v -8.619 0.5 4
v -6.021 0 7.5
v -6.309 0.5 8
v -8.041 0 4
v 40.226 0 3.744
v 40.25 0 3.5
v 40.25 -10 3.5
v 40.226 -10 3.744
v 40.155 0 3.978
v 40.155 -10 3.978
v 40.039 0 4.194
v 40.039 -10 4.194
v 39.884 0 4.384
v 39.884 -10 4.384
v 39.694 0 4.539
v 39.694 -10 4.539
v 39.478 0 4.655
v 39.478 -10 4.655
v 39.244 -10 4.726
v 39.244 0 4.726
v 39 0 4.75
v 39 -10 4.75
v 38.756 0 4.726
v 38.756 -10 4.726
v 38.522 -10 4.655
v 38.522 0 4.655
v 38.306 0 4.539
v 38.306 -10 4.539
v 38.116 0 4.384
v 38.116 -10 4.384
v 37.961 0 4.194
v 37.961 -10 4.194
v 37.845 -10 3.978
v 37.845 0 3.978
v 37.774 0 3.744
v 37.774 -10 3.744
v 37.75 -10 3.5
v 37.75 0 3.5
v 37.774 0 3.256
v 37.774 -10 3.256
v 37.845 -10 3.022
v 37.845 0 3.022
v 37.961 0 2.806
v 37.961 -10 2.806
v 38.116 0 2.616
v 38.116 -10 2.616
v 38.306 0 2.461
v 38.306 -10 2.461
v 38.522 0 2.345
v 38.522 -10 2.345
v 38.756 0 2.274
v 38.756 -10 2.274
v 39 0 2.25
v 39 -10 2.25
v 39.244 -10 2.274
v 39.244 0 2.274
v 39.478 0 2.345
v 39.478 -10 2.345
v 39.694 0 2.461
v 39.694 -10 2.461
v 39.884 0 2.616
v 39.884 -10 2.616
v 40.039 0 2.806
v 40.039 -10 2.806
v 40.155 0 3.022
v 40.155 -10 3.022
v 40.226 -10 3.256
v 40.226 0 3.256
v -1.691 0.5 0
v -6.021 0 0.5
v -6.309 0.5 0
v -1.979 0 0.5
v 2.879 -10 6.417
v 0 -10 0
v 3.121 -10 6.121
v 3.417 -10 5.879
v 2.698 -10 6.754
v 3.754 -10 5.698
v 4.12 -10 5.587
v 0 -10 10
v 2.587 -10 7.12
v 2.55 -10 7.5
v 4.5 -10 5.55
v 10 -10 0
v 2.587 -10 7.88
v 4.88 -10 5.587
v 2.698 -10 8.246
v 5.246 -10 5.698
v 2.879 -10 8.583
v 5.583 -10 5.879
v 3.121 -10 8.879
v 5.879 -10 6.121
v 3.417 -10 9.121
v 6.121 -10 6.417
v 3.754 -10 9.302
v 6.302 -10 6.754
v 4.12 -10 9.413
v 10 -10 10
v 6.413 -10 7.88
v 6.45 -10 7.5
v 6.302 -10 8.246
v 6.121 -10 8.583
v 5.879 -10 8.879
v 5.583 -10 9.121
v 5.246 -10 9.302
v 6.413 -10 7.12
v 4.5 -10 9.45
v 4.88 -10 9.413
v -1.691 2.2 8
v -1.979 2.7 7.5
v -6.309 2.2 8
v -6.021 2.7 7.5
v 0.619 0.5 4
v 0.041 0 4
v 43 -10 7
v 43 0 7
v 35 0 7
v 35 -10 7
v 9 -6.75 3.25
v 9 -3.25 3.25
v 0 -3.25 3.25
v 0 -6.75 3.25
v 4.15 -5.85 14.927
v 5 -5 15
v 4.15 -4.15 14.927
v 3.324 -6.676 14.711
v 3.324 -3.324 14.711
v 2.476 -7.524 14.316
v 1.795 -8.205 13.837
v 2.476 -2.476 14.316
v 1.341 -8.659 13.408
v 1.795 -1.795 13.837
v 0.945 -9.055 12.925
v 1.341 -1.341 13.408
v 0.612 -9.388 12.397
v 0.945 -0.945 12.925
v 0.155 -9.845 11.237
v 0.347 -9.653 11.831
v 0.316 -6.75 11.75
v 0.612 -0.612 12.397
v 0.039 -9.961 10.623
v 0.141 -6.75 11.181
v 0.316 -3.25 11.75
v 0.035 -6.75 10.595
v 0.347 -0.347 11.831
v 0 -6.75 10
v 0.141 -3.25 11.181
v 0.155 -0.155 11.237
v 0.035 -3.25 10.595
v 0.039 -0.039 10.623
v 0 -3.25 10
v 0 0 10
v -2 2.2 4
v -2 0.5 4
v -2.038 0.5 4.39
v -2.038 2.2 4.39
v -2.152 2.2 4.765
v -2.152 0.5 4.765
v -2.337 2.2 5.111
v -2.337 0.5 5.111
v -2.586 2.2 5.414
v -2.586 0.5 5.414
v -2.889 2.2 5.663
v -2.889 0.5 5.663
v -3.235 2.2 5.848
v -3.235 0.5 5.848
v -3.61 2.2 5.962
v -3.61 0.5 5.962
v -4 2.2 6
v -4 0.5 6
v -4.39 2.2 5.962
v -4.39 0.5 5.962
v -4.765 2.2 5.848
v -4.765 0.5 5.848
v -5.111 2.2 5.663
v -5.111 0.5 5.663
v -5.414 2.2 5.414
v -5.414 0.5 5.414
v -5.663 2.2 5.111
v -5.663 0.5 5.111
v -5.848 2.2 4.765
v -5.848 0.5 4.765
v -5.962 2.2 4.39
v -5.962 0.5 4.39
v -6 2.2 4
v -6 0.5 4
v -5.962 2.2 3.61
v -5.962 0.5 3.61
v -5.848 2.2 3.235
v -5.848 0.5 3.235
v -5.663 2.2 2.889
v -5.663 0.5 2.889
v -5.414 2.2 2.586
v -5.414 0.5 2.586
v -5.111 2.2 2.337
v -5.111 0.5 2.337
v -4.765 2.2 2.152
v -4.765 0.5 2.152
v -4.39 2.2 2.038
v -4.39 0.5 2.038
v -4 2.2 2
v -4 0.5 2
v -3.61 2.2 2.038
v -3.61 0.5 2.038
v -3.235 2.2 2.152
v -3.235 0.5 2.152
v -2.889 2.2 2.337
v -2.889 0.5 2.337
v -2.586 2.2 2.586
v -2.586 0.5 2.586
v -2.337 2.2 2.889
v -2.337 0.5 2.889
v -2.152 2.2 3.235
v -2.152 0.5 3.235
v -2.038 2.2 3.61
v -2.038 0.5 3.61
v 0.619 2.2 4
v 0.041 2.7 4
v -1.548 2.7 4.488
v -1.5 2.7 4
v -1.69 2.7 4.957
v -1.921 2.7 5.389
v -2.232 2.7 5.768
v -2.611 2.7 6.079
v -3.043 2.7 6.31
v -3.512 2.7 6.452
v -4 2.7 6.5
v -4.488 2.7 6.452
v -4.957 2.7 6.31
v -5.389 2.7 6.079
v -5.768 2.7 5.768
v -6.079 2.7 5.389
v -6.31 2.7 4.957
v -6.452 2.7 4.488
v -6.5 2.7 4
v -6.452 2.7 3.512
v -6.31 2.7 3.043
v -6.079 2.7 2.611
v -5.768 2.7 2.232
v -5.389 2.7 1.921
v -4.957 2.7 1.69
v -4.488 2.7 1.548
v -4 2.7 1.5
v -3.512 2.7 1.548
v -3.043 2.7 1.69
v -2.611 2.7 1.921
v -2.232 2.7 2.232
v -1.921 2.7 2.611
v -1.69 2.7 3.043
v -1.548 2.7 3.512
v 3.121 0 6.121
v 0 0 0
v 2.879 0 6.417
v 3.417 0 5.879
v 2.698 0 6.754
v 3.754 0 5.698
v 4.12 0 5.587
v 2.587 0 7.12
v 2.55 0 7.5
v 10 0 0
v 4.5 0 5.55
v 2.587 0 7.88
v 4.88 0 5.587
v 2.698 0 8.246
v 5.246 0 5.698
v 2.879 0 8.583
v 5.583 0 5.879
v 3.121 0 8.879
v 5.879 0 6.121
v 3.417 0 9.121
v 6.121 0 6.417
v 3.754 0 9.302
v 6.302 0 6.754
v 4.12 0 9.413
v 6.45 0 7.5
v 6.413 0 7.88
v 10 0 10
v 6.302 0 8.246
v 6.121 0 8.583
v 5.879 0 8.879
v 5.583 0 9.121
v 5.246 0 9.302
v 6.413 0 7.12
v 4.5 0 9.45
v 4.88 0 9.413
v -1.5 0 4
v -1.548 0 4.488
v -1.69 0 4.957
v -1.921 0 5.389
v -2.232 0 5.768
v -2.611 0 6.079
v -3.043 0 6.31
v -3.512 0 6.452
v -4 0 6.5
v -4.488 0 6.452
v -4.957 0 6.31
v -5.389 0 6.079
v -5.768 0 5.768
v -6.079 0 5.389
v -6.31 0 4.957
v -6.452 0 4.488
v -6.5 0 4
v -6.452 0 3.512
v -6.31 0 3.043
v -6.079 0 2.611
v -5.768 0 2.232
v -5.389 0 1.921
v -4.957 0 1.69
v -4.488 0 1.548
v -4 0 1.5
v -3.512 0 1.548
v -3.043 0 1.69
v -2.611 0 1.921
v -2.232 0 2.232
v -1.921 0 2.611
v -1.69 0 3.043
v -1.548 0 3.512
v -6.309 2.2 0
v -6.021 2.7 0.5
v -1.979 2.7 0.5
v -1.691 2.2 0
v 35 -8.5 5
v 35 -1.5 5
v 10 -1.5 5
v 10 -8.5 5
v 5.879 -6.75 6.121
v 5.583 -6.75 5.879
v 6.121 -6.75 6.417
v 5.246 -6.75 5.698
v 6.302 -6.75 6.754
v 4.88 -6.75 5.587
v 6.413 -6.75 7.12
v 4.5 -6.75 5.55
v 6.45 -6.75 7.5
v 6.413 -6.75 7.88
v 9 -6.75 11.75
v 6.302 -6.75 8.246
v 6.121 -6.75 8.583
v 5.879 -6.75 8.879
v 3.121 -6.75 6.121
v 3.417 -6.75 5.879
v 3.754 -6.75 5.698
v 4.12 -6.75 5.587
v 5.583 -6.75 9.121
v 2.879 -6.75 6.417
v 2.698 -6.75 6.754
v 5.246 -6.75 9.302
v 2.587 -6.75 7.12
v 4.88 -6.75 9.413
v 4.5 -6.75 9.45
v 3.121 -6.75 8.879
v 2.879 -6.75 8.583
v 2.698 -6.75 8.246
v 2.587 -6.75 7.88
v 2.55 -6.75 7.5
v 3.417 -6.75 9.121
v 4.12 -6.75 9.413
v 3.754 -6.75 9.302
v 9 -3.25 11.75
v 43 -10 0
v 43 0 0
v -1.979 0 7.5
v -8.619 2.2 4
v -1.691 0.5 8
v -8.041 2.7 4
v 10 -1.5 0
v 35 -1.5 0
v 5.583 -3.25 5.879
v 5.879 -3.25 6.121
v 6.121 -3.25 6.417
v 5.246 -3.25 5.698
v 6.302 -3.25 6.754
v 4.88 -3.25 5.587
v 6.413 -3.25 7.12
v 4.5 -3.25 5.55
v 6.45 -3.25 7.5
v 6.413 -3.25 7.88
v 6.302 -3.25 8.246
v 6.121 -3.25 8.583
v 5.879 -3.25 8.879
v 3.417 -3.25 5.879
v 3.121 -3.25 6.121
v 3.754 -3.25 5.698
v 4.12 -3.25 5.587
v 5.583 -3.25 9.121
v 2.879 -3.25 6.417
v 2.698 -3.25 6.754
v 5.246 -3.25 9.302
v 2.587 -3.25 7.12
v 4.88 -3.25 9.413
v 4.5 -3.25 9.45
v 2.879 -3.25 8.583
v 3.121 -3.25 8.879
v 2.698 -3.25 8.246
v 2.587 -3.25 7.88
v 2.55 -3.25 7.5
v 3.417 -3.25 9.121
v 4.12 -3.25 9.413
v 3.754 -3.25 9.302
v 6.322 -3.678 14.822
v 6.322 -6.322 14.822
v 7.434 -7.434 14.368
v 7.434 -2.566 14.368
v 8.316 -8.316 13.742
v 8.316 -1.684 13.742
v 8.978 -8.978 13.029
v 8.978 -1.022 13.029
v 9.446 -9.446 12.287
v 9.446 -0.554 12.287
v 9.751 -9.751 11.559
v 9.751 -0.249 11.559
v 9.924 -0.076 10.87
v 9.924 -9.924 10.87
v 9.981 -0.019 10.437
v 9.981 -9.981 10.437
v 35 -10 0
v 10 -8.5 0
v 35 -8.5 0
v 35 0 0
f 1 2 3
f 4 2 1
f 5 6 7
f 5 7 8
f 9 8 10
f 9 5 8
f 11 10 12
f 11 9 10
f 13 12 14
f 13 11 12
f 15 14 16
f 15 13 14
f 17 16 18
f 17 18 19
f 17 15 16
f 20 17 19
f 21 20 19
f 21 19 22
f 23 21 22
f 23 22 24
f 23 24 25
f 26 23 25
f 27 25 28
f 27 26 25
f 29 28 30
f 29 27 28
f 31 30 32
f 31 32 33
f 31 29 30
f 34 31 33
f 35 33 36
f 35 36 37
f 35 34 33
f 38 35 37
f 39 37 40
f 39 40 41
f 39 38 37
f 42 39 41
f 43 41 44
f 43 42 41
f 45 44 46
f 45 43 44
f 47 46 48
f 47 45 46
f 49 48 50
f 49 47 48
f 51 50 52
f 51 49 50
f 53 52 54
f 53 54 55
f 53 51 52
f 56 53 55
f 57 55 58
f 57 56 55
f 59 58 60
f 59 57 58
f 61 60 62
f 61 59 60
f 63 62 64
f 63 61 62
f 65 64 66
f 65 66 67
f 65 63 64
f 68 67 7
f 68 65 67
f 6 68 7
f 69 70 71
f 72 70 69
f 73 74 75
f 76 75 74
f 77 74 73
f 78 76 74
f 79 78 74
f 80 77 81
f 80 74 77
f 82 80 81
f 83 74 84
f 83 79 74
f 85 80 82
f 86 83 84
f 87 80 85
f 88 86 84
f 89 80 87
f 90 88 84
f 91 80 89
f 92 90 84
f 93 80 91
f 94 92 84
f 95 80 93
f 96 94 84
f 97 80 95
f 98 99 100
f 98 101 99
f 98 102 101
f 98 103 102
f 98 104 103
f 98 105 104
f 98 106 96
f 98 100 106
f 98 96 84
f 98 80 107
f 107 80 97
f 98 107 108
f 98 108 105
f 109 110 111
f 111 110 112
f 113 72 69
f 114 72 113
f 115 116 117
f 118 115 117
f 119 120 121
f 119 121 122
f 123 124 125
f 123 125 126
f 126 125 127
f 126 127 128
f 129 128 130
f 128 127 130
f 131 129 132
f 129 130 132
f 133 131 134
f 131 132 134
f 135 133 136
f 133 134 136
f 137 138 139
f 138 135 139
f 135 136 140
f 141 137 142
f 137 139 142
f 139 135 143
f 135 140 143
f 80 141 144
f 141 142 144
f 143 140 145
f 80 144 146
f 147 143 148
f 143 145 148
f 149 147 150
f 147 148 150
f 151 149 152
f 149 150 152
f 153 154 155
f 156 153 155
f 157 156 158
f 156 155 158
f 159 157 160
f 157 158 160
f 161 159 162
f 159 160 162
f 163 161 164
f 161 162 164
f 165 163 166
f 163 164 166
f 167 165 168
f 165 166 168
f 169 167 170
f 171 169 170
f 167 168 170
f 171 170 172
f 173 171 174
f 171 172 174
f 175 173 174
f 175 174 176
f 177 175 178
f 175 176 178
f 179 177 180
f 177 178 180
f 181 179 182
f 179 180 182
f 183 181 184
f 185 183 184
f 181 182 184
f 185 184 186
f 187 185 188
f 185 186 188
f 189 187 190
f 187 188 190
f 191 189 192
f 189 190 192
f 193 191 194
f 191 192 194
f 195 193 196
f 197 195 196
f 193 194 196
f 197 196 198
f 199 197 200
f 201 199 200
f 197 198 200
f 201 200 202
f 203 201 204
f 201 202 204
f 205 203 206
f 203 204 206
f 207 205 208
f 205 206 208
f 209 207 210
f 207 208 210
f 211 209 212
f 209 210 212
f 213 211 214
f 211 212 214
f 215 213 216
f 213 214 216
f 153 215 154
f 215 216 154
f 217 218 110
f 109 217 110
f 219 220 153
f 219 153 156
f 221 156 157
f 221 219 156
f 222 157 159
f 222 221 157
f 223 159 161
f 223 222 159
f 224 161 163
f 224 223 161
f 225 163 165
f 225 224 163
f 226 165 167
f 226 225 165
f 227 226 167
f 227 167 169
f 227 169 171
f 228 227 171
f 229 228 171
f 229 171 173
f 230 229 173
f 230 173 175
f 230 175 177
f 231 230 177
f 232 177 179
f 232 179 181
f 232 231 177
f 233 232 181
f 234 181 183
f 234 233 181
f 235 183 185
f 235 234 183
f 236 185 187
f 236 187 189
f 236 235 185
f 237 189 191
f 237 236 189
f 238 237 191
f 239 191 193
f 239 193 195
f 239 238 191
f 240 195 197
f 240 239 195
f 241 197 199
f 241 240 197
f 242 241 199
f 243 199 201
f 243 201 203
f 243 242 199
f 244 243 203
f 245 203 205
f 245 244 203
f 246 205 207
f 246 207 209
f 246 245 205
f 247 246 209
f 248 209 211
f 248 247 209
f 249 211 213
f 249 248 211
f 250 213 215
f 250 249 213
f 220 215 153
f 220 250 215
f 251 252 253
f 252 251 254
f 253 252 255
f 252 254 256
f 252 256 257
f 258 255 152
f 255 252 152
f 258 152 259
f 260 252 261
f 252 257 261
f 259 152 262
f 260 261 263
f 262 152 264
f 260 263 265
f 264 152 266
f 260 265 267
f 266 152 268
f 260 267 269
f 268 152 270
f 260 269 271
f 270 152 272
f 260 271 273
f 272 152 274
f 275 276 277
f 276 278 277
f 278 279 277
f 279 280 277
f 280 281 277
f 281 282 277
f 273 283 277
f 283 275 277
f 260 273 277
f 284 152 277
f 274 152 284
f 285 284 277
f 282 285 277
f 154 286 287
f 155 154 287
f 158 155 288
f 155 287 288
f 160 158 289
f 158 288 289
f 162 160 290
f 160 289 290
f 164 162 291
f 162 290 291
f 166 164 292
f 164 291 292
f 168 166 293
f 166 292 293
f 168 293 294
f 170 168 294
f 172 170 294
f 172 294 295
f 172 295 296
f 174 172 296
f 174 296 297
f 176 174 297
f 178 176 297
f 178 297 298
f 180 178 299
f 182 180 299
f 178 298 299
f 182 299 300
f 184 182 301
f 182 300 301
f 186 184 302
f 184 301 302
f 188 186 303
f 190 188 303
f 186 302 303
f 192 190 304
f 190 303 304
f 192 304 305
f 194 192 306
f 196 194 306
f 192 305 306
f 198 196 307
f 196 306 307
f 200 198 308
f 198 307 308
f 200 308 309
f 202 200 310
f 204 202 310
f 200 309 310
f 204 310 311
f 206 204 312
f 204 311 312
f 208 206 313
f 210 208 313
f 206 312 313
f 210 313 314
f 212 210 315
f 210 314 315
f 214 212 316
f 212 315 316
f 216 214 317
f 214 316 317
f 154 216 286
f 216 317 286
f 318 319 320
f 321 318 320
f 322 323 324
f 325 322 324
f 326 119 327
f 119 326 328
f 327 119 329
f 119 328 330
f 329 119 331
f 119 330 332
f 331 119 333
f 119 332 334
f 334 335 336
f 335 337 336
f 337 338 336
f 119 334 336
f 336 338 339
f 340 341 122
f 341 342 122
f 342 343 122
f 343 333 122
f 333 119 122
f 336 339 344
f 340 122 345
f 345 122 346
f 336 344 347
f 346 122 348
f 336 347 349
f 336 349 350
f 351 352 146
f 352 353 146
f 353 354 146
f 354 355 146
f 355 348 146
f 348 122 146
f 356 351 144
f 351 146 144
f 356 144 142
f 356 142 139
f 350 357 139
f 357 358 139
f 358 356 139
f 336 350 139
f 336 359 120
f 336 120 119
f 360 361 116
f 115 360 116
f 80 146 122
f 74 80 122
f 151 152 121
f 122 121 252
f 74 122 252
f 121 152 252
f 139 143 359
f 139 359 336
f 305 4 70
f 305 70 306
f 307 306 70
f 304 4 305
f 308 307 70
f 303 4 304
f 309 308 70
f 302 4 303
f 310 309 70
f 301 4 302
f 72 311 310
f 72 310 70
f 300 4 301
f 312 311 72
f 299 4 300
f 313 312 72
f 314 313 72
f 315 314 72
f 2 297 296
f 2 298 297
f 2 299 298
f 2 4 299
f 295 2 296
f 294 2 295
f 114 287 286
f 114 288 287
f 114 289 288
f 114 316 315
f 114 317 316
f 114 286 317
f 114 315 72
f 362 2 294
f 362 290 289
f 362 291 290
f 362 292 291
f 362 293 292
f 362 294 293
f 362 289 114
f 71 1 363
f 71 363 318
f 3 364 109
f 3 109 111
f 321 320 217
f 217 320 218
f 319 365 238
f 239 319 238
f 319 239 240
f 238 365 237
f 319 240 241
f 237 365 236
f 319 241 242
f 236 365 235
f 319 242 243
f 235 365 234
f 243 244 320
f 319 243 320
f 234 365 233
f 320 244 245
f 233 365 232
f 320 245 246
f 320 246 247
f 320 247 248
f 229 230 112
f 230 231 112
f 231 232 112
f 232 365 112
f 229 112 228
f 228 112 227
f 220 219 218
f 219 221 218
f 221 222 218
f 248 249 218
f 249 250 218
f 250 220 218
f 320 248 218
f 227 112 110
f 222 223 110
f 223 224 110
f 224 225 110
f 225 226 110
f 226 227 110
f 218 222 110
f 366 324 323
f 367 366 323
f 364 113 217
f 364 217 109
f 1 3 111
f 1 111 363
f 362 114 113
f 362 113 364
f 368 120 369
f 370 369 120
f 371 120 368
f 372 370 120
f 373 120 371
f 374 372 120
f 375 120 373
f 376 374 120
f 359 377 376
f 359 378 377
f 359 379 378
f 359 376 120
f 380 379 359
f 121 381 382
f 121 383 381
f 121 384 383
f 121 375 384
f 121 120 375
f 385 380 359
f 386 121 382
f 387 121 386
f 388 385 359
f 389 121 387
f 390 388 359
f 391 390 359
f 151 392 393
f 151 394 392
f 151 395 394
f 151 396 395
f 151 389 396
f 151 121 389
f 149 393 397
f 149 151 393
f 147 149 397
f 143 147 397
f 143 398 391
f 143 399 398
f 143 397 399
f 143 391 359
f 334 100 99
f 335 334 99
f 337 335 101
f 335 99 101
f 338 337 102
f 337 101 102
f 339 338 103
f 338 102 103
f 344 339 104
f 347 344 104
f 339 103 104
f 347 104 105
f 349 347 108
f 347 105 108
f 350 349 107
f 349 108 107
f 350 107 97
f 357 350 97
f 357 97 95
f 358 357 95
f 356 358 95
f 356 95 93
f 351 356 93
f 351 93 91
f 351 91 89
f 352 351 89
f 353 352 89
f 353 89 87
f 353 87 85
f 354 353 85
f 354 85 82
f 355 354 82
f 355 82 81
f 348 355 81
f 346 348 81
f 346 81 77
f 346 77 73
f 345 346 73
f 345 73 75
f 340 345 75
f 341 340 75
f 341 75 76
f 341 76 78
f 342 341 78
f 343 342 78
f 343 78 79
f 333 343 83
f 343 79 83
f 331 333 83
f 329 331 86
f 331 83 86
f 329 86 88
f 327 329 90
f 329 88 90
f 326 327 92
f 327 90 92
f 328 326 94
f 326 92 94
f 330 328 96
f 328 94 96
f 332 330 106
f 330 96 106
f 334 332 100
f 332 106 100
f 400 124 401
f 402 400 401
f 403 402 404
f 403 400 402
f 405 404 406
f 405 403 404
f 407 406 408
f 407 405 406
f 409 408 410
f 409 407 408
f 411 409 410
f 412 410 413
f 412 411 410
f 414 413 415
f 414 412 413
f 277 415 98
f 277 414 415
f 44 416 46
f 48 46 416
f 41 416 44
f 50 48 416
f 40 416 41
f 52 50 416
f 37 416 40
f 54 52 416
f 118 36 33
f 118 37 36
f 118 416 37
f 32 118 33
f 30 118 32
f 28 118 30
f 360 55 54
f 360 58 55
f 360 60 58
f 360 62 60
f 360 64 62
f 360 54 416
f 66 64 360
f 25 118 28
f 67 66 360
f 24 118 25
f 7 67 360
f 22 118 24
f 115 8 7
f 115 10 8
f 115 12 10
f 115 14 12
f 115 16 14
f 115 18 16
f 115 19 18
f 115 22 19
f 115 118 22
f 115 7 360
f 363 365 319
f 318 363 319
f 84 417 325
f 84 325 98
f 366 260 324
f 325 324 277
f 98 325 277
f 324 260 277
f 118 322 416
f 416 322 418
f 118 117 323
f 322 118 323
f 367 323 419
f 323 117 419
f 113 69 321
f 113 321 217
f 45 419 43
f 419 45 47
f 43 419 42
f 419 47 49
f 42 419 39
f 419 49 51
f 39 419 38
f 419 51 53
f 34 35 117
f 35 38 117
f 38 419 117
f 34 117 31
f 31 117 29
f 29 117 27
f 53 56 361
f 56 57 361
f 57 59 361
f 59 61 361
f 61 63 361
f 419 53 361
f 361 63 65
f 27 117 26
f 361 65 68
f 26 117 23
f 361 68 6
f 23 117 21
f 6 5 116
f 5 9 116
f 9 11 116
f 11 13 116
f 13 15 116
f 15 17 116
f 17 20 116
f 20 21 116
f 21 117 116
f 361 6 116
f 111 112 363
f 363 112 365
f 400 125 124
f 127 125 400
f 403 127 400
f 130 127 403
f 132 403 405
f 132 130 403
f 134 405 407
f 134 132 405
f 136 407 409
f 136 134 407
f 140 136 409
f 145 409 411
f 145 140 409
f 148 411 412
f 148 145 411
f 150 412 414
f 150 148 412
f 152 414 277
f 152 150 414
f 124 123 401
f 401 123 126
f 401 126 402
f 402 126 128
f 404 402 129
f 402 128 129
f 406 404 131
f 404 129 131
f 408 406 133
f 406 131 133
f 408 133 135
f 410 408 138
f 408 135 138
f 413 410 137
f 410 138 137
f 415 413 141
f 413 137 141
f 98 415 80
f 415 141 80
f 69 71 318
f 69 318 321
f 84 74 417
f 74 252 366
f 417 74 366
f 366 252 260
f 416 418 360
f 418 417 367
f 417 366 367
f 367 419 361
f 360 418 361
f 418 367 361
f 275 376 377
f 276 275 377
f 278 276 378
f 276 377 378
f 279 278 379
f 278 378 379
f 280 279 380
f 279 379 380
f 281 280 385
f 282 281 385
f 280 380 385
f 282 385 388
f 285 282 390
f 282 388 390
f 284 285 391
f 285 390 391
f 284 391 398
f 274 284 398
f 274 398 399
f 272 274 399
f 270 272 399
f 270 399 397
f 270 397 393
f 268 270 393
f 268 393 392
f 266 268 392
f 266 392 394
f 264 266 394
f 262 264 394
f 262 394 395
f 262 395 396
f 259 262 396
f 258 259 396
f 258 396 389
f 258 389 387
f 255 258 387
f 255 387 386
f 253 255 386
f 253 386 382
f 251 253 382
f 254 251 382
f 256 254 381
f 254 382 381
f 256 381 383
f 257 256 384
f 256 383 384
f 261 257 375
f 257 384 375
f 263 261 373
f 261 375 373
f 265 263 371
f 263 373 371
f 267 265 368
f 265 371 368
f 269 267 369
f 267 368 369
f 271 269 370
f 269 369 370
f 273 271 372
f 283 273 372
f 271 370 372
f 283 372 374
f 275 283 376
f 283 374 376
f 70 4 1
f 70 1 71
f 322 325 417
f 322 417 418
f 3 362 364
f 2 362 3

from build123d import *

# Parameters (mm, degrees)
F0_R        = 1.25
F1_DEPTH    = 10
F2_W        = 3.5
F2_H        = 8.5
F3_DEPTH    = 9
F4_R        = 1.95
F5_DEPTH    = 10
F6_T1_DEPTH = 35
F6_T3_DEPTH = 35
F7_W        = 25
F7_H        = 1.5
F8_DEPTH    = 5
F9_R        = 2
F10_DEPTH   = 2.7
F11_SIZE    = 0.5


# Not quite as in the source:
# - a fillet or chamfer that OpenCascade refuses, or shapes differently, is made with other operations: its cross-section is extruded or revolved along the edge and cut away or added


with BuildPart() as f1:
    # F0 (on Front) → F1 (new body)
    with BuildSketch(Plane.XZ):
        Polygon((10, 15), (0, 15), (0, 0), (43, 0), (43, 7), (35, 7), (35, 5), (10, 5), align=None)
        with Locations((39, 3.5)):
            Circle(F0_R, mode=Mode.SUBTRACT)
    extrude(amount=F1_DEPTH)

    # F2 (on face) → F3 (cut)
    with BuildSketch(Plane(origin=(0, 0, 0), x_dir=(0, -1, 0), z_dir=(-1, 0, 0))):
        with Locations((5, 7.5)):
            Rectangle(F2_W, F2_H)
    extrude(amount=-F3_DEPTH, mode=Mode.SUBTRACT)

    # F4 (on face) → F5 (cut, through all)
    with BuildSketch(Plane.XZ.offset(10)):
        with Locations((4.5, 7.5)):
            Circle(F4_R)
    extrude(amount=-F5_DEPTH, mode=Mode.SUBTRACT)

    # F6: fillet of radius 5 on 4 edges, made by hand

    # F6_s2 → F6_t1 (cut)
    with BuildSketch(Plane.XZ.offset(-12.5)):
        with BuildLine():
            ThreePointArc((5, 15), (8.5355339059, 13.5355339059), (10, 10))
            Line((10, 10), (10, 15))
            Line((10, 15), (5, 15))
        make_face()
        with BuildLine():
            ThreePointArc((5, 15), (1.4644660941, 13.5355339059), (0, 10))
            Line((0, 10), (0, 15))
            Line((0, 15), (5, 15))
        make_face()
    extrude(amount=F6_T1_DEPTH, mode=Mode.SUBTRACT)

    # F6_s4 → F6_t3 (cut)
    with BuildSketch(Plane.YZ.offset(-12.5)):
        with BuildLine():
            ThreePointArc((-5, 15), (-1.4644660941, 13.5355339059), (0, 10))
            Line((0, 10), (0, 15))
            Line((0, 15), (-5, 15))
        make_face()
        with BuildLine():
            ThreePointArc((-5, 15), (-8.5355339059, 13.5355339059), (-10, 10))
            Line((-10, 10), (-10, 15))
            Line((-10, 15), (-5, 15))
        make_face()
    extrude(amount=F6_T3_DEPTH, mode=Mode.SUBTRACT)

    # F7 (on face) → F8 (cut, through all)
    with BuildSketch(Plane.XY.offset(5)):
        with Locations((22.5, -0.75)):
            Rectangle(F7_W, F7_H)
        with Locations((22.5, -9.25)):
            Rectangle(F7_W, F7_H)
    extrude(amount=-F8_DEPTH, mode=Mode.SUBTRACT)


with BuildPart() as f10:
    # F9 (on Front) → F10 (new body)
    with BuildSketch(Plane.XZ):
        Polygon((-8.6188021535, 4), (-6.3094010768, 0), (-1.6905989232, 0), (0.6188021535, 4), (-1.6905989232, 8), (-6.3094010768, 8), align=None)
        with Locations((-4, 4)):
            Circle(F9_R, mode=Mode.SUBTRACT)
    extrude(amount=-F10_DEPTH)

    # F11
    f11_edges = [f10.edges().sort_by_distance(p)[0] for p in [
        (-7.464102, 2.7, 2),
        (-4, 2.7, 0),
        (-0.535898, 2.7, 2),
        (-0.535898, 2.7, 6),
        (-4, 2.7, 8),
        (-7.464102, 2.7, 6),
        (-6, 2.7, 4),
        (-7.464102, 0, 2),
        (-4, 0, 0),
        (-0.535898, 0, 2),
        (-0.535898, 0, 6),
        (-4, 0, 8),
        (-7.464102, 0, 6),
        (-6, 0, 4),
    ]]
    chamfer(f11_edges, length=F11_SIZE)


solid = Compound([f1.part, f10.part])
